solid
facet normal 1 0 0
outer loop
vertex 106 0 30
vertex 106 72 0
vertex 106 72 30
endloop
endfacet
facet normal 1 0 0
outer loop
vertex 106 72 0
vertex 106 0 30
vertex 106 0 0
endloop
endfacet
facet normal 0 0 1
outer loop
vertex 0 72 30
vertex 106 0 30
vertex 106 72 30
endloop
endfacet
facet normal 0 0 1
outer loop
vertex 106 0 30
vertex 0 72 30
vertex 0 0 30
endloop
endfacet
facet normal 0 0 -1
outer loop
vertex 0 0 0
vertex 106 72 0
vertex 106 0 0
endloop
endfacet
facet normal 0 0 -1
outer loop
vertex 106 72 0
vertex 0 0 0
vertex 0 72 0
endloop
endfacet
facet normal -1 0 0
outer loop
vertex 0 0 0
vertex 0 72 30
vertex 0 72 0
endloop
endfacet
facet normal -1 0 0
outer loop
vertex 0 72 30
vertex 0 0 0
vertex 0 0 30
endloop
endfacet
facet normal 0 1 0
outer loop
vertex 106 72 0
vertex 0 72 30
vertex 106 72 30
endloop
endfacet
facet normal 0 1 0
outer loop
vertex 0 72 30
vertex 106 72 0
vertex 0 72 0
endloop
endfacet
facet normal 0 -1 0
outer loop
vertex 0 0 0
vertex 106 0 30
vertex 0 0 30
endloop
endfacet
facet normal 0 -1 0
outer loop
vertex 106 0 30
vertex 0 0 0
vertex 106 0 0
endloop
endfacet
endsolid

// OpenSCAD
// Bench Rack for 1.5 mL Microcentrifuge Tubes
// Designed for FDM printing. Rests on XY plane at Z=0.

// --- Dimensions ---
// Block dimensions
$block_length = 106; // X
$block_width = 72;   // Y
$block_height = 30;  // Z

// Grid configuration
$grid_rows = 4;      // Rows along Y
$grid_cols = 6;      // Columns along X
$grid_spacing_x = 16; // Centre-to-centre X
$grid_spacing_y = 16; // Centre-to-centre Y

// Hole configuration
$hole_diameter = 11.2;
$hole_depth = 25;    // Depth of the hole (open top, closed bottom)
$floor_thickness = 5; // Solid floor at bottom (30 - 25 = 5)

// --- Settings ---
$fn = 64; // Smooth curves for holes

// --- Calculations ---
// Calculate offsets to center the grid on the block
// Total grid width = (cols - 1) * spacing
// Offset from edge = (Block Width - Total Grid Width) / 2
$offset_x = ($block_length - ($grid_cols - 1) * $grid_spacing_x) / 2;
$offset_y = ($block_width - ($grid_rows - 1) * $grid_spacing_y) / 2;

// --- Main Block ---
difference() {
    // 1. Create the solid rectangular block at Z=0
    translate([0, 0, 0]) {
        cube([
            $block_length,
            $block_width,
            $block_height
        ]);
    }

    // 2. Cut the holes
    // We iterate through rows (r) and columns (c)
    for (r = [0 : $grid_rows - 1], c = [0 : $grid_cols - 1]) {
        // Calculate position of current hole center relative to block origin (0,0,0)
        $x_pos = $offset_x + c * $grid_spacing_x;
        $y_pos = $offset_y + r * $grid_spacing_y;
        
        // Create the hole cylinder
        $r_hole = $hole_diameter / 2;
        
        // Translate to hole position
        // We place the cylinder such that it cuts through the block.
        // Top of block is Z=30. Bottom of hole is Z=5.
        // We extend the cylinder slightly past the top (30.1) and bottom (4.9) 
        // to ensure clean cuts and non-coplanar faces.
        translate([
            $x_pos,
            $y_pos,
            30.1 // Start slightly above the top surface
        ]) {
            cylinder(
                h = $hole_depth + 0.1, // Height covers 30.1 down to 4.9
                r1 = $r_hole,
                r2 = $r_hole,
                $fn = $fn
            );
        }
    }
}
